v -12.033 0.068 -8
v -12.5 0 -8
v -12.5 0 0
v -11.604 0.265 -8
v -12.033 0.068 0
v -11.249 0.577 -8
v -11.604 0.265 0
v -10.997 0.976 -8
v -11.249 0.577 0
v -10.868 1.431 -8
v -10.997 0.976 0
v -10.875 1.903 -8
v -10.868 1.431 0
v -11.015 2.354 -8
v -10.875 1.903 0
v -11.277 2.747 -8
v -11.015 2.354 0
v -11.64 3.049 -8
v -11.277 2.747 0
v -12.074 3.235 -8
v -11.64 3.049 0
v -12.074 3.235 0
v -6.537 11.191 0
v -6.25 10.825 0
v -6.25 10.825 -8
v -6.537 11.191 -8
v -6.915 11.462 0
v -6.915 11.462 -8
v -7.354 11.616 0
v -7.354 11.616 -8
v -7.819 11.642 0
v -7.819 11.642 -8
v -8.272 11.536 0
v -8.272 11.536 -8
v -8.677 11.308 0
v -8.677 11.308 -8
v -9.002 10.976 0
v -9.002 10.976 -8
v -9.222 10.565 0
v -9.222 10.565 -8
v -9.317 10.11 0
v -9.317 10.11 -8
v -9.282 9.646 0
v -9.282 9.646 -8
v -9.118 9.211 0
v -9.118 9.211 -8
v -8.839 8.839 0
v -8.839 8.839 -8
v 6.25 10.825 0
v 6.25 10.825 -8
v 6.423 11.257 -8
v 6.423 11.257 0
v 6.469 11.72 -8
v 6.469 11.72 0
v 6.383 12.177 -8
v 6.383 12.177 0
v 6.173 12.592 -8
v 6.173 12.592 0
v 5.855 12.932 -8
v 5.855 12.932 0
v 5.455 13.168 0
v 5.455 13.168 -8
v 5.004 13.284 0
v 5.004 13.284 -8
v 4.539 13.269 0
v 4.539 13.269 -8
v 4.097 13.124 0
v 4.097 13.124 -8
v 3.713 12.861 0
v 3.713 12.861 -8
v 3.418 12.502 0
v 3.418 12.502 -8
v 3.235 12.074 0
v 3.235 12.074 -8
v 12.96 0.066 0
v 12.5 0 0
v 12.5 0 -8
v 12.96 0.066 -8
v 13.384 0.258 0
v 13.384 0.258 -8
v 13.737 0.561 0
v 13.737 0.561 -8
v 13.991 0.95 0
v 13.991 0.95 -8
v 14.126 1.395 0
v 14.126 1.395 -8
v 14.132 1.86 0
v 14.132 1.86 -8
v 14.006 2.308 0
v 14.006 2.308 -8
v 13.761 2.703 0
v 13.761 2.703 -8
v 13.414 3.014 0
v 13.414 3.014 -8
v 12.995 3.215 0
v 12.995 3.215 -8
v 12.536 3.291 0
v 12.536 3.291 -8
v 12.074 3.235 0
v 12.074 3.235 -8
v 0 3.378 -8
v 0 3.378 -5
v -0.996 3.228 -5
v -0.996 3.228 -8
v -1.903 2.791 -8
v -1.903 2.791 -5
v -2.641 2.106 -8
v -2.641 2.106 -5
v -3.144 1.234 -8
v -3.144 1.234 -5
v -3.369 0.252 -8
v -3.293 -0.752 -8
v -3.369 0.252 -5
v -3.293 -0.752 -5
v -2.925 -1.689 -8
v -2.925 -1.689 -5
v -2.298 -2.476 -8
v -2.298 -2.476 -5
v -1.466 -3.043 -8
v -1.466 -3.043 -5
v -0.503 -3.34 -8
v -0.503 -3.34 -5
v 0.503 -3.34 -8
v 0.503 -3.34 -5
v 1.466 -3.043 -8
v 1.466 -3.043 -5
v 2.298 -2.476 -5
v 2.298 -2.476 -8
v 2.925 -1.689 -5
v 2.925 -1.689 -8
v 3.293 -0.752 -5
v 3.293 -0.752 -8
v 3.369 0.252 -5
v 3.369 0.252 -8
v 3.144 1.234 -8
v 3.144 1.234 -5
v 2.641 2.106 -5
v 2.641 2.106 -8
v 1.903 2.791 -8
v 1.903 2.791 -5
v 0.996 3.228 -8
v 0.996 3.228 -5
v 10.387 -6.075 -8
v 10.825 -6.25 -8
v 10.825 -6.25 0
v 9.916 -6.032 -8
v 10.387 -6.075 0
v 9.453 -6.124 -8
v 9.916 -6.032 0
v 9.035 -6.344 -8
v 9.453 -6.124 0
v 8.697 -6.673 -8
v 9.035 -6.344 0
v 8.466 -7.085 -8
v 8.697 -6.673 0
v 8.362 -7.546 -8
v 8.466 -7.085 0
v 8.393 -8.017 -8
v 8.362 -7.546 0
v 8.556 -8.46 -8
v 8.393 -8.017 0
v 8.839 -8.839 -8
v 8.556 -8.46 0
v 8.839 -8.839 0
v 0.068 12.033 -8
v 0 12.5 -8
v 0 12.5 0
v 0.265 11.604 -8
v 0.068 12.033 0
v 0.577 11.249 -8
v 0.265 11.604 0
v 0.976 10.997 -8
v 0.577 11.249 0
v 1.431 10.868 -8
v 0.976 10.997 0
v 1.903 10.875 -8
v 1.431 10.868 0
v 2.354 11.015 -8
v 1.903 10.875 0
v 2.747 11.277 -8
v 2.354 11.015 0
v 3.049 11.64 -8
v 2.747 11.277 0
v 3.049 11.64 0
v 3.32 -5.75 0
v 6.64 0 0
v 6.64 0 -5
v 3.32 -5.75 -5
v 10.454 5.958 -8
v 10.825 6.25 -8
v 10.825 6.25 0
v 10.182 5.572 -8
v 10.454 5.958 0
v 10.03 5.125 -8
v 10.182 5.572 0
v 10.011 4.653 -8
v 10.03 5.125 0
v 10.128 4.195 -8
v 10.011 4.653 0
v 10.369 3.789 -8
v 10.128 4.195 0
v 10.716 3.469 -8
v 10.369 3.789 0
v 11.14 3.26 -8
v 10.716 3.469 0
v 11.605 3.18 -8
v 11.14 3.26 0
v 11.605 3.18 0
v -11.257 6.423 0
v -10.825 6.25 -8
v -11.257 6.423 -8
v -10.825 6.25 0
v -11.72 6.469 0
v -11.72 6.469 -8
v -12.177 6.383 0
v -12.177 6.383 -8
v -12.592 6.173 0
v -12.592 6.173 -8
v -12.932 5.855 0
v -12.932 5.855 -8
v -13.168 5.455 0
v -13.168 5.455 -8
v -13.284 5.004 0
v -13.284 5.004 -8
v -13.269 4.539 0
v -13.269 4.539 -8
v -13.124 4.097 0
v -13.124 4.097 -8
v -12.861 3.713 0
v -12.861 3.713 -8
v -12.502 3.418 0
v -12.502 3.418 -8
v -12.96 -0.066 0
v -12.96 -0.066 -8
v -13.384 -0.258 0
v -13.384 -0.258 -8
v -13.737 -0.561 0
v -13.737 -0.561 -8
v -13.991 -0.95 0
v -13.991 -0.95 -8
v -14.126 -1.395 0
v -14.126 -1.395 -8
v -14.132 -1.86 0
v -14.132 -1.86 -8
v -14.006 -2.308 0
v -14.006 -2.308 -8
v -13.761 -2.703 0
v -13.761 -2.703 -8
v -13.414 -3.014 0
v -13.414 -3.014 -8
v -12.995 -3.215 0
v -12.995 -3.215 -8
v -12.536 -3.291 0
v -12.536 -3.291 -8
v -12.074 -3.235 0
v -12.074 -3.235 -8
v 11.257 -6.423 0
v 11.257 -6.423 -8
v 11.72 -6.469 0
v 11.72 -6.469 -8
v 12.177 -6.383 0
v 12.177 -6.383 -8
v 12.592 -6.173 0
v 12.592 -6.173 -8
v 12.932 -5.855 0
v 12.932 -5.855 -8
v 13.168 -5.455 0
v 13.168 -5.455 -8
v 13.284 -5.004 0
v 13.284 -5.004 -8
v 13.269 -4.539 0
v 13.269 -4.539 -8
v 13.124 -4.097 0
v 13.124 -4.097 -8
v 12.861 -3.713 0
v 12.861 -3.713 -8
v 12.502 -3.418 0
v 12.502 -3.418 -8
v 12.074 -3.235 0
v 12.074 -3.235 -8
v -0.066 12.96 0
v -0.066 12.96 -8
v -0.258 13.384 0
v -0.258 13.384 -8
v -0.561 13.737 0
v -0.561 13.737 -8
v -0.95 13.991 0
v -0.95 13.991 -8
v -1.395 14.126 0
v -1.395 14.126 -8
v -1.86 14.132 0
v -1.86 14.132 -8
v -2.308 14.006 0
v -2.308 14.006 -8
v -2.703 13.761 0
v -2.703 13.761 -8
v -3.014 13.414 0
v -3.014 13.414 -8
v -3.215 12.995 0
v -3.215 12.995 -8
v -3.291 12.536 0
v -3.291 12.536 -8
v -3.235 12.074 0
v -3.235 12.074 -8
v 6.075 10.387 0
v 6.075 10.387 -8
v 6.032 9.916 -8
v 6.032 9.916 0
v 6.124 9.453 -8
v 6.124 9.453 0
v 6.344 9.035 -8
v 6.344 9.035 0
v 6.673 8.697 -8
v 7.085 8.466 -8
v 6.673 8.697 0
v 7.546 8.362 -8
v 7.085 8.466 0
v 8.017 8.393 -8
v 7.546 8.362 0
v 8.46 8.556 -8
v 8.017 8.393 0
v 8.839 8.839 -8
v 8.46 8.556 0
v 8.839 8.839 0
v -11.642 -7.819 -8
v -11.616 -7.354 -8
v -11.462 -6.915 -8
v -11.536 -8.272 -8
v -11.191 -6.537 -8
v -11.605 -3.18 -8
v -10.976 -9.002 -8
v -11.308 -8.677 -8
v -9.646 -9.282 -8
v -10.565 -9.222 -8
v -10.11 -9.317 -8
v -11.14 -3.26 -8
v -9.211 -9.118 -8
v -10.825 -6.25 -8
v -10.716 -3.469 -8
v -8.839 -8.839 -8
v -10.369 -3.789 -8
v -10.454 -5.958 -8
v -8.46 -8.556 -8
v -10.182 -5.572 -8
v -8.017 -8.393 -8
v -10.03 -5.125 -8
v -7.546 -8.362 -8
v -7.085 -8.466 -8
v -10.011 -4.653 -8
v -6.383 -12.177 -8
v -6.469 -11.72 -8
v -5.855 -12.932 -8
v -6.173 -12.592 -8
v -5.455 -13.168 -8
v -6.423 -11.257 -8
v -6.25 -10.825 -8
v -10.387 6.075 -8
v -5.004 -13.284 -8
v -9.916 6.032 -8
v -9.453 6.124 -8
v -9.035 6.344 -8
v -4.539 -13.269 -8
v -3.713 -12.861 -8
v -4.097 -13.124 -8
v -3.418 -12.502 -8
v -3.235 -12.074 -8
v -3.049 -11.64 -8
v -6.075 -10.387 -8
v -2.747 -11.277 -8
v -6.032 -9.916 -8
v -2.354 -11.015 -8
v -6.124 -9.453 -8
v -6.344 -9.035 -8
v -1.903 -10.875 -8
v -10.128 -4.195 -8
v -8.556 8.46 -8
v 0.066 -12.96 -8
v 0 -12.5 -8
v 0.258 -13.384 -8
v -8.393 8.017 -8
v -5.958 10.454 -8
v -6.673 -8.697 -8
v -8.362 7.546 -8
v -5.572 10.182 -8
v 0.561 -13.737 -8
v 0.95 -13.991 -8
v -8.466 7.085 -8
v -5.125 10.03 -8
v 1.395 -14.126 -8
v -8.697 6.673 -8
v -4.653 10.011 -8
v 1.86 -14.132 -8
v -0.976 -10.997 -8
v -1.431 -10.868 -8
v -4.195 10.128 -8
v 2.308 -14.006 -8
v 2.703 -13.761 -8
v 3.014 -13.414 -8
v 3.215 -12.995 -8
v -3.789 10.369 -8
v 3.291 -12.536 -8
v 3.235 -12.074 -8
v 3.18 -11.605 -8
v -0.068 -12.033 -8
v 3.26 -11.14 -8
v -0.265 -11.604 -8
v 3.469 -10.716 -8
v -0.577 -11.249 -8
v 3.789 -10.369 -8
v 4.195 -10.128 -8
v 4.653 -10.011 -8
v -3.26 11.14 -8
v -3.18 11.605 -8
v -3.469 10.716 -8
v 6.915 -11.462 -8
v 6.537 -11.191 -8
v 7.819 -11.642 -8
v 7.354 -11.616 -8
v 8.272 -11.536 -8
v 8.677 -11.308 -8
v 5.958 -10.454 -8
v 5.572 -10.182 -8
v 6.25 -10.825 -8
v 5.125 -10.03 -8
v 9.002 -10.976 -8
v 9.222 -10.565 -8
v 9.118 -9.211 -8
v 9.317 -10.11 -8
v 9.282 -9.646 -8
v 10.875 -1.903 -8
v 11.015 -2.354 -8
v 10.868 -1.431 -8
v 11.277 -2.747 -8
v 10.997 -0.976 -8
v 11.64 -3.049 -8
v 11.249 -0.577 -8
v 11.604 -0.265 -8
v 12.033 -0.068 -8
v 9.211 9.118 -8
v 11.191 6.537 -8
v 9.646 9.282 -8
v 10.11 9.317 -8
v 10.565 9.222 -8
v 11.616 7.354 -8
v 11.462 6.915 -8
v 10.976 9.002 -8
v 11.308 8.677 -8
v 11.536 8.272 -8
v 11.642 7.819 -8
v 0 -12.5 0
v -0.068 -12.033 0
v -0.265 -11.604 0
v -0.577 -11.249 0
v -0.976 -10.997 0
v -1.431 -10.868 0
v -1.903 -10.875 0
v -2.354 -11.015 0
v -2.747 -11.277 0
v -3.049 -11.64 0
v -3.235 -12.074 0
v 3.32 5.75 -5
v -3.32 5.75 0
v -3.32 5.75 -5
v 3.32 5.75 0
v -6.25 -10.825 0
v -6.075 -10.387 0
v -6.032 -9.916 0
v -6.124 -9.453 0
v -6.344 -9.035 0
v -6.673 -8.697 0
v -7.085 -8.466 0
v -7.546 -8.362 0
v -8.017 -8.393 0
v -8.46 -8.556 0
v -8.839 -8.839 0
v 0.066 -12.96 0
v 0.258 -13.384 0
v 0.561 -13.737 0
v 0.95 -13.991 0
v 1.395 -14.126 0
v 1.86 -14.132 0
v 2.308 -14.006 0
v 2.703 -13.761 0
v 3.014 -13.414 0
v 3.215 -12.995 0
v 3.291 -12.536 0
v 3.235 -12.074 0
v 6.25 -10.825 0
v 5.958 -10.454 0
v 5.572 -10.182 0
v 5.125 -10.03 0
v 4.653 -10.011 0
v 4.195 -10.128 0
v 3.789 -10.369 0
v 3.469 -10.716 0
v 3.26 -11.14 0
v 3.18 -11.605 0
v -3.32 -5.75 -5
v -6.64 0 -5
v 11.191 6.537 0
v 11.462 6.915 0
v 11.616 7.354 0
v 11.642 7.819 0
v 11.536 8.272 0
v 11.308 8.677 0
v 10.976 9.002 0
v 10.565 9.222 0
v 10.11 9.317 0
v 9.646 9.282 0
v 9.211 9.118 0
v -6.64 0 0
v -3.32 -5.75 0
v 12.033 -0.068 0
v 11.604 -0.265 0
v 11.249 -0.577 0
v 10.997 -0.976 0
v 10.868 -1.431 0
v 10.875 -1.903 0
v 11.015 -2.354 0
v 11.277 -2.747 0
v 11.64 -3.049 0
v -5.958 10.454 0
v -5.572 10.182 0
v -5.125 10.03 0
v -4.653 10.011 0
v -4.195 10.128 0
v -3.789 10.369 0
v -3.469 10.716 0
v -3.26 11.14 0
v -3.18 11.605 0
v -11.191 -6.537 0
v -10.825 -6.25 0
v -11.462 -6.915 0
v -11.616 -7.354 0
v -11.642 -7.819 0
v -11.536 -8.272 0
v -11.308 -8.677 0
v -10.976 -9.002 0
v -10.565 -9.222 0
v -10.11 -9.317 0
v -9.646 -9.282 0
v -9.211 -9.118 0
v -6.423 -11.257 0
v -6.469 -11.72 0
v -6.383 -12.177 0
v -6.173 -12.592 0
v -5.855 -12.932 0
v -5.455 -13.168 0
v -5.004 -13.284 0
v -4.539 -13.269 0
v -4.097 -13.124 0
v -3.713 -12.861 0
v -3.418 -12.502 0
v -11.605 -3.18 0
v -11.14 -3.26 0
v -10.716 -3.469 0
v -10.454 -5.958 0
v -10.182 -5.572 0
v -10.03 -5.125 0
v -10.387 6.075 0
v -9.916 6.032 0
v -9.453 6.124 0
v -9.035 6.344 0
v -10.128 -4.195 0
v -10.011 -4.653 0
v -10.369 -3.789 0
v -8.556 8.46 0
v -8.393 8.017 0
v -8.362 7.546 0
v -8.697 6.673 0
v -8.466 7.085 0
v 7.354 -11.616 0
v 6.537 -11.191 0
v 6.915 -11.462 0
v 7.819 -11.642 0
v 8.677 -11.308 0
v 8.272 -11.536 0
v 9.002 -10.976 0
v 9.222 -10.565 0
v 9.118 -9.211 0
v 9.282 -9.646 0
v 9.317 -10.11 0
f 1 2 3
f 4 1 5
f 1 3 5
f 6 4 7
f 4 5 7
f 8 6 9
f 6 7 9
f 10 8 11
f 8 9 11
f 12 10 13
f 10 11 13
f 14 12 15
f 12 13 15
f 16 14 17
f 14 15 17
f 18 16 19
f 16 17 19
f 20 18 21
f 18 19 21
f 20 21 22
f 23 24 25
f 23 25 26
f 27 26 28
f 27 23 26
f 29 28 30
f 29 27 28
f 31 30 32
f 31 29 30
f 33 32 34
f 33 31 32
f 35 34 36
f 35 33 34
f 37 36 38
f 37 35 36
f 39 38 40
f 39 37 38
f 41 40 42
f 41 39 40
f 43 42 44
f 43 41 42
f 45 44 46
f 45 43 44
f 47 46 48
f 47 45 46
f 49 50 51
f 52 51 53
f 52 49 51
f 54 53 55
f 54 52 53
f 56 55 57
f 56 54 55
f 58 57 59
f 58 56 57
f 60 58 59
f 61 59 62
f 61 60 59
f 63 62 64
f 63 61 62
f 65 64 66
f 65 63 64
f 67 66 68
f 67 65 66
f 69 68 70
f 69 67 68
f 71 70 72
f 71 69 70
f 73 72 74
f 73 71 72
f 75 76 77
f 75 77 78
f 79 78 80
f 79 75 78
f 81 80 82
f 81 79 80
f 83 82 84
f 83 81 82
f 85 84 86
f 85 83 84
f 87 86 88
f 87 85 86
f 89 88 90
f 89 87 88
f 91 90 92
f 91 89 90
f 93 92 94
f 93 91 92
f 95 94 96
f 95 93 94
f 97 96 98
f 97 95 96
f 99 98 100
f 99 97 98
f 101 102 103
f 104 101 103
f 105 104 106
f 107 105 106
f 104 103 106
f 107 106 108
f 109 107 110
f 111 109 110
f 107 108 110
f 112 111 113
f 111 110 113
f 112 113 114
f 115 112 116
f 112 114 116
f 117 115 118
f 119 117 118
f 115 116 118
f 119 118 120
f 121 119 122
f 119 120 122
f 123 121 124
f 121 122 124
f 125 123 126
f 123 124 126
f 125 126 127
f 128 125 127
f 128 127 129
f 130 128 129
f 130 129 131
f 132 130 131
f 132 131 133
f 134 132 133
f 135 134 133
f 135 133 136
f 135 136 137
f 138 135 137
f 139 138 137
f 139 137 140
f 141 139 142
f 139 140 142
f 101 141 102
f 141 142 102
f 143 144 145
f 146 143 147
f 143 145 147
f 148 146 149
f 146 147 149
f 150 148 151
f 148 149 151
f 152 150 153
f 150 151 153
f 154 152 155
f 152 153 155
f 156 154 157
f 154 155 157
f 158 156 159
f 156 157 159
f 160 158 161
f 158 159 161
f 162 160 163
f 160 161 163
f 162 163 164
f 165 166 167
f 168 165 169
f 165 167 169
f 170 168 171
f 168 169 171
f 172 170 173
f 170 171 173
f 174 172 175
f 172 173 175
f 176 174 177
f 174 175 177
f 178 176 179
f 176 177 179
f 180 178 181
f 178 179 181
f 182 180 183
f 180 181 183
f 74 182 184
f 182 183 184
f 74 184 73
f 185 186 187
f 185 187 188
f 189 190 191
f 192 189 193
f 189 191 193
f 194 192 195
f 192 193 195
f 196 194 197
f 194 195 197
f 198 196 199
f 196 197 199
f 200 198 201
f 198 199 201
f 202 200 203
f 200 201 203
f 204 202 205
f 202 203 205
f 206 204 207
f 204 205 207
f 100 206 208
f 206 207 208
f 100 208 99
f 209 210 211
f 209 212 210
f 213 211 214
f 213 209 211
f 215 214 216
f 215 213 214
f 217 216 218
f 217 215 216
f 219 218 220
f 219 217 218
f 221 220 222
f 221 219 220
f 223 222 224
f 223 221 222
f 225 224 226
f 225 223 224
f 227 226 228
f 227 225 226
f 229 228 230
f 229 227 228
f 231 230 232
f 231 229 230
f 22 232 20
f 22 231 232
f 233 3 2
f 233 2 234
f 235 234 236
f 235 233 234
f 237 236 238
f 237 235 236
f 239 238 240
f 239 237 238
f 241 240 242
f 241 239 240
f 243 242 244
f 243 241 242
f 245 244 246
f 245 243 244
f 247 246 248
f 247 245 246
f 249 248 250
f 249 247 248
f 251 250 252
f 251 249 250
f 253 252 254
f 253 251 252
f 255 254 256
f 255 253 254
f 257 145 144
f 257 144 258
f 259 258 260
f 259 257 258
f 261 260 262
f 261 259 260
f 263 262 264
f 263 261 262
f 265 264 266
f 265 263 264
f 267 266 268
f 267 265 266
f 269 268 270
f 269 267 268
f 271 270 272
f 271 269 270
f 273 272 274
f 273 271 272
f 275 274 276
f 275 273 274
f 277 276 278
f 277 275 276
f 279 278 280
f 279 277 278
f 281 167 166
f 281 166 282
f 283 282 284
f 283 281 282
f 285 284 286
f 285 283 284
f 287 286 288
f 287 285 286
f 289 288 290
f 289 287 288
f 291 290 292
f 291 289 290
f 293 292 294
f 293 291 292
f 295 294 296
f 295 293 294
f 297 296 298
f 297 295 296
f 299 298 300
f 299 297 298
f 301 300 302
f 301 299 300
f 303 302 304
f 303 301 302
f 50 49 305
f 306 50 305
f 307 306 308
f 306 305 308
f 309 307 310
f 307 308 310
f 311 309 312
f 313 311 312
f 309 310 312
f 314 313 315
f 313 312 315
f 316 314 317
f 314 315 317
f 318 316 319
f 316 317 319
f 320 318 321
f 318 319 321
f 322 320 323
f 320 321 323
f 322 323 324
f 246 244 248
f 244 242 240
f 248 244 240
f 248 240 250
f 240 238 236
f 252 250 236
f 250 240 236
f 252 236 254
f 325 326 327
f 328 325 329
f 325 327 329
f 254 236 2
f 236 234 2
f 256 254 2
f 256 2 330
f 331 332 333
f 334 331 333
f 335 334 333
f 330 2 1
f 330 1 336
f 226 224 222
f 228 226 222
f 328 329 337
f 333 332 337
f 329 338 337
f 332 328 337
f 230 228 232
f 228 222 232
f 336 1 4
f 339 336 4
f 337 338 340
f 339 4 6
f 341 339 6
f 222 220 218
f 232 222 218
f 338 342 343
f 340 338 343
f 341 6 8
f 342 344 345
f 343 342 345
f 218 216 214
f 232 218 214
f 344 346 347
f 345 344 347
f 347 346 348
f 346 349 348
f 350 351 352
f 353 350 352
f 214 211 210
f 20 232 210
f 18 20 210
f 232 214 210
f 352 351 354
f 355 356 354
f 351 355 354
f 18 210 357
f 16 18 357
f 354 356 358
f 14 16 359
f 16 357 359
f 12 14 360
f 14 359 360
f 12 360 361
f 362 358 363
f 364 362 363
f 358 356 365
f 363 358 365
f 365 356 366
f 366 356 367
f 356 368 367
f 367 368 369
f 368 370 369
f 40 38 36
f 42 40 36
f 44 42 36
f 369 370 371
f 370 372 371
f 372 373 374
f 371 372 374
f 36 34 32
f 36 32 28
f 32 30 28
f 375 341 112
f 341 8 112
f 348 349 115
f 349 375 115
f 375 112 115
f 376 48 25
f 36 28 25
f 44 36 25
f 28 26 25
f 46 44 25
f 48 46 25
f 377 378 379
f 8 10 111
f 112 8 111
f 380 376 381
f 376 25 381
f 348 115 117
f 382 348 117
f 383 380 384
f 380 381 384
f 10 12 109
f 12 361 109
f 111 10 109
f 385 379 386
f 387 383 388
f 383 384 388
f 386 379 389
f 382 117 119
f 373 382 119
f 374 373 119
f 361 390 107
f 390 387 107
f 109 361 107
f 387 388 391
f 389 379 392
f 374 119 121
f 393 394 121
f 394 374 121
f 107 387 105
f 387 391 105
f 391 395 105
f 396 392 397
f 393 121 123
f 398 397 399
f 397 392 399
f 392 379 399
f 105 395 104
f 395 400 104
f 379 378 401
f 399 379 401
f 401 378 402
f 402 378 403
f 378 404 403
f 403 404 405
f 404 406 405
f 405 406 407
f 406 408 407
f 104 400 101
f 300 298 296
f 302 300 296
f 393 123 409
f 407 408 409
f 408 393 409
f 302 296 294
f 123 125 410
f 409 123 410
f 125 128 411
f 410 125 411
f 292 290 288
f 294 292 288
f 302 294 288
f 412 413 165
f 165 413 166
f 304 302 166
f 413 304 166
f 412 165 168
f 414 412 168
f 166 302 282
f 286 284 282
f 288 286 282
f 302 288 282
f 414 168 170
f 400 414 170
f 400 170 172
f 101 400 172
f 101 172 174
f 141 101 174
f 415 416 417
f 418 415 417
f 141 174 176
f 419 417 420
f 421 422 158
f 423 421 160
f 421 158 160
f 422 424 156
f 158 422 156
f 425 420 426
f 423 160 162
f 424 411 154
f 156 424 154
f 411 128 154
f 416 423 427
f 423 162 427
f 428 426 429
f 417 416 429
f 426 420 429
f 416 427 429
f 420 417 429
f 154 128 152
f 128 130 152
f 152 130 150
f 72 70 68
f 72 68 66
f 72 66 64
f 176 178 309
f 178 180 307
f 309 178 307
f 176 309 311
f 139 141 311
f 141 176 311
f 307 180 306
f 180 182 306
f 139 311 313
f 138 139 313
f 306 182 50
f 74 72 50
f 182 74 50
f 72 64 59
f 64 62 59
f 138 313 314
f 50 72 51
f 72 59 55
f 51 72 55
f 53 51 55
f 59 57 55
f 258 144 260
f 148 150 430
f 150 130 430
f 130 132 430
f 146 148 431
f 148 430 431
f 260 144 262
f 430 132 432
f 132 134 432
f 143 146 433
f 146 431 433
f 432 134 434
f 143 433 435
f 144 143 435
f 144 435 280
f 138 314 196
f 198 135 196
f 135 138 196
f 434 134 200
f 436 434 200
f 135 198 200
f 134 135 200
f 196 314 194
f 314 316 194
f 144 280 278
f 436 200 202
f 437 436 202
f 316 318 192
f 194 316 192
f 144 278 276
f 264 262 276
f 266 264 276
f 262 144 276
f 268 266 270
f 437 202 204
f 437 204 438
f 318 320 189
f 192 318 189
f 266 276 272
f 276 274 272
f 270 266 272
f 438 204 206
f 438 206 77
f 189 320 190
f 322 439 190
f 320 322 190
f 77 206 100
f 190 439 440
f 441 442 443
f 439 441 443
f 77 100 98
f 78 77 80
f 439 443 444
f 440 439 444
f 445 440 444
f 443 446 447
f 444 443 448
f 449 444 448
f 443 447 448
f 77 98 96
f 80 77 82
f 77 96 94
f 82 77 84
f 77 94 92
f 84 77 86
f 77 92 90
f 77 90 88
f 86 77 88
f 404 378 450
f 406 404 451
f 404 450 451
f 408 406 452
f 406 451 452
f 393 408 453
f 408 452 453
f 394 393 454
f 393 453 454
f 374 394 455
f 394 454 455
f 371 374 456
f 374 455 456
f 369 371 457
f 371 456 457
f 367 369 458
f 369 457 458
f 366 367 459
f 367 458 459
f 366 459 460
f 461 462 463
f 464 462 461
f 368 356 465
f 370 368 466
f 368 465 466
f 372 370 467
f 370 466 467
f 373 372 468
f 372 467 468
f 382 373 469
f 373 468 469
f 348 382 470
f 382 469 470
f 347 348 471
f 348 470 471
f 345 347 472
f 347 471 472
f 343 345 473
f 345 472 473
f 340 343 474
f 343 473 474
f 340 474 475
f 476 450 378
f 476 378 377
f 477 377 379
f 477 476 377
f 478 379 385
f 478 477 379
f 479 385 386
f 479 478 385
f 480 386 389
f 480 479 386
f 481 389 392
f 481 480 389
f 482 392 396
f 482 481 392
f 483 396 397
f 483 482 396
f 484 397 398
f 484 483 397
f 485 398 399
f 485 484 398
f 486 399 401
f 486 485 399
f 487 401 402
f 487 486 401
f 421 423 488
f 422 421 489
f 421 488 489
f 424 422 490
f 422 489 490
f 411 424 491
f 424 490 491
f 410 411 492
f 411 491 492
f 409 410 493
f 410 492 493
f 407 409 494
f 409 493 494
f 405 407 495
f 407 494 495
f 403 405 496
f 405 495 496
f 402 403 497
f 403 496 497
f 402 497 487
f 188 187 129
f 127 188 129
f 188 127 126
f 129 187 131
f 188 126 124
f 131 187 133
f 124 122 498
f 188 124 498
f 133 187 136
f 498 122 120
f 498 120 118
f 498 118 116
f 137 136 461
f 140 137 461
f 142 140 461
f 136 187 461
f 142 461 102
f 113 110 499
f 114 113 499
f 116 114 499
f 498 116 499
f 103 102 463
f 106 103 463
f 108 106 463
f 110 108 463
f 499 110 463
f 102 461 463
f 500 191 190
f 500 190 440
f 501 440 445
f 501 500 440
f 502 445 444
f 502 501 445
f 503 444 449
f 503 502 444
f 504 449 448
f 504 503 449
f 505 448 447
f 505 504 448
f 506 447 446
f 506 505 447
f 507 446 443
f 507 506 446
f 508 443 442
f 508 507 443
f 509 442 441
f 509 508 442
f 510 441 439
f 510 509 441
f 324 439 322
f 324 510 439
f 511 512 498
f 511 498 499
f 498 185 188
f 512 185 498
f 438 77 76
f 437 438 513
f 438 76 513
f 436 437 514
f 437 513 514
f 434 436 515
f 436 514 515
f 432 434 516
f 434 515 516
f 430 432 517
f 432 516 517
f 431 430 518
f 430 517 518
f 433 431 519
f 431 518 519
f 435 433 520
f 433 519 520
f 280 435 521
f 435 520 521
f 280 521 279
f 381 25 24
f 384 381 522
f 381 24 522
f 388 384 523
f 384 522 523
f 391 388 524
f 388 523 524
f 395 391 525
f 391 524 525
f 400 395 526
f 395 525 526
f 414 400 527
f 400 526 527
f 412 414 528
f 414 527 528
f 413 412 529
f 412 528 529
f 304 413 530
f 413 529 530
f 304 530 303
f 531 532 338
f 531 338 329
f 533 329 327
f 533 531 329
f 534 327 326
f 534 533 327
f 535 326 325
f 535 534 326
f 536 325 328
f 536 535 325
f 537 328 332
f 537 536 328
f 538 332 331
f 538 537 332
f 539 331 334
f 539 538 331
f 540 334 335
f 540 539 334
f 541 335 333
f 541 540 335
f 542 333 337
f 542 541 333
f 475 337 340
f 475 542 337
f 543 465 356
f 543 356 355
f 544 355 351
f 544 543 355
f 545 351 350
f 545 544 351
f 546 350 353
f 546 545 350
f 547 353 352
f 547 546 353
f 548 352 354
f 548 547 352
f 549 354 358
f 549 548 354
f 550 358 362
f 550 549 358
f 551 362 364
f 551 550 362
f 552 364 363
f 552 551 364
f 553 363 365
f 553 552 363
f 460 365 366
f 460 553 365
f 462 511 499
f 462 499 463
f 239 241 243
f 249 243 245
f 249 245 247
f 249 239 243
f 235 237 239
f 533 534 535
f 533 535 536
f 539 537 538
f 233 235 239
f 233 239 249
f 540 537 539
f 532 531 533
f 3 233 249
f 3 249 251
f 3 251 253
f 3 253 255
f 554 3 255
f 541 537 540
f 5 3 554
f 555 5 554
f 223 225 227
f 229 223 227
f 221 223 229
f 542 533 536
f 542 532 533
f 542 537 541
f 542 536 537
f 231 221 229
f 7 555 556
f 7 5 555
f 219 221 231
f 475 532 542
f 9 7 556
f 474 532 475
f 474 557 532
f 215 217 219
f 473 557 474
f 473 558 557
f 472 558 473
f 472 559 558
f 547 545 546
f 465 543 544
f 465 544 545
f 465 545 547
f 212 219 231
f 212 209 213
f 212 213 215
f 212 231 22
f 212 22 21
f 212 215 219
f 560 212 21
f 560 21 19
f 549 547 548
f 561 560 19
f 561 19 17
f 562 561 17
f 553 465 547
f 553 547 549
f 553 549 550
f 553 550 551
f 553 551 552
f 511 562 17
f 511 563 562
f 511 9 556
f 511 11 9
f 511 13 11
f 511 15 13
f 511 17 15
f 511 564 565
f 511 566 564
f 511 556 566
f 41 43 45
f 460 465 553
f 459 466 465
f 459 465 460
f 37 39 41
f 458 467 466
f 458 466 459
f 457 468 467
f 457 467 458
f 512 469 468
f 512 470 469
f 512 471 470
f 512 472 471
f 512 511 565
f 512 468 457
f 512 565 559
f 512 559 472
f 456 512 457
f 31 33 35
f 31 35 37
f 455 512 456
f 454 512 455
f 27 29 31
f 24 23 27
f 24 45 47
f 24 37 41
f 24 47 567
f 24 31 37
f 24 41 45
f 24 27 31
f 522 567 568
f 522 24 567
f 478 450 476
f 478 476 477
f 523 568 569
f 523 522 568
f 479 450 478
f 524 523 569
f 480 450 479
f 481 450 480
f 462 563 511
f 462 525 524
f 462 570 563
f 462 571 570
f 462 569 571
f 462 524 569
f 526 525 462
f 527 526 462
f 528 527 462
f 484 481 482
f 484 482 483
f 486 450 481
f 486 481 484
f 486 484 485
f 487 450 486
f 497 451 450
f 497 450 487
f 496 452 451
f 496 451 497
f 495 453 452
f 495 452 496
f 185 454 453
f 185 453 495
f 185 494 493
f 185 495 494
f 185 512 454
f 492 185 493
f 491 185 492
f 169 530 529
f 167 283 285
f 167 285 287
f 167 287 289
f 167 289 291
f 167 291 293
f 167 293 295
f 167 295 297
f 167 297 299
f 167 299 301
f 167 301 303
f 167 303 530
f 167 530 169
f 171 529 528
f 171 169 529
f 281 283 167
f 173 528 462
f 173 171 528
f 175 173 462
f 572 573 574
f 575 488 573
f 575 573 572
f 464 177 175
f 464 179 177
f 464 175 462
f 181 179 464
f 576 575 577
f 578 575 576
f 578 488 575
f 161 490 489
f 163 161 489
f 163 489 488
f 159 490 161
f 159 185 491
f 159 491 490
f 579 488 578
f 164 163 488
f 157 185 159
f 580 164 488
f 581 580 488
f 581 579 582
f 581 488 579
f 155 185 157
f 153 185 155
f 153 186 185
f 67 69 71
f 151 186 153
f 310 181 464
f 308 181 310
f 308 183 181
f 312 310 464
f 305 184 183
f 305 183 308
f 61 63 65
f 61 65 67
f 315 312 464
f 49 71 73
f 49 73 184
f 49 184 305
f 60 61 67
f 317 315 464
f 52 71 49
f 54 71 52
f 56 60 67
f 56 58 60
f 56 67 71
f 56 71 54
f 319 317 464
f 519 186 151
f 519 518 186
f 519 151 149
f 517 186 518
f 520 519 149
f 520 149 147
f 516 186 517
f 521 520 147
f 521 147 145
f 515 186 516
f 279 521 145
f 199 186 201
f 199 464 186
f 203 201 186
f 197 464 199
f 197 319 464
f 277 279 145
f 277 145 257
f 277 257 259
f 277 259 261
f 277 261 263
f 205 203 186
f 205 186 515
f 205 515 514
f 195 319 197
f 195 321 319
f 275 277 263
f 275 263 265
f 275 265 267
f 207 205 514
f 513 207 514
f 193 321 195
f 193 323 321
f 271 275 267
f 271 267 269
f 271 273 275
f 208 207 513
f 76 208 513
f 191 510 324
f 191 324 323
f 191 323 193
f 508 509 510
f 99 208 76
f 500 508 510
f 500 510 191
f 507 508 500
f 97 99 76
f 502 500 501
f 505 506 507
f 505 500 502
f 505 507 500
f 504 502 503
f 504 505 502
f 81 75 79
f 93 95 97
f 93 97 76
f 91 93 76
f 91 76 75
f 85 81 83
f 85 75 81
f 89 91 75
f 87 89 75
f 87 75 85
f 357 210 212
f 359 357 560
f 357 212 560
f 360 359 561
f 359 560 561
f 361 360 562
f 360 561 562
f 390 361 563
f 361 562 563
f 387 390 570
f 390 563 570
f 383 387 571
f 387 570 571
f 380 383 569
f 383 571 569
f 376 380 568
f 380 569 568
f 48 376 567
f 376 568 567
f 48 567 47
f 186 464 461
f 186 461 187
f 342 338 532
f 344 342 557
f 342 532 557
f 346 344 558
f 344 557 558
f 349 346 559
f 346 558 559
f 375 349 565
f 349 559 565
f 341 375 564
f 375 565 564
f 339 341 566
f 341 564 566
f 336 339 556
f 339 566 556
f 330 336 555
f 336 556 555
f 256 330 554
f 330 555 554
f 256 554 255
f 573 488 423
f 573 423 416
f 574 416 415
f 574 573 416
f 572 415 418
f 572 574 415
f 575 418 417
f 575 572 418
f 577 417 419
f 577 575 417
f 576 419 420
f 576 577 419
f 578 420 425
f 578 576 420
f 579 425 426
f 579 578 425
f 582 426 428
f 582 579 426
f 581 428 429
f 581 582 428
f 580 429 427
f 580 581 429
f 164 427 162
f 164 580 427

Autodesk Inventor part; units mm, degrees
ref_plane "YZ Plane" through (0, 0, 0) normal (1, 0, 0) x (0, 1, 0)
ref_plane "XZ Plane" through (0, 0, 0) normal (0, 1, 0) x (-1, 0, 0)
ref_plane "XY Plane" through (0, 0, 0) normal (0, 0, 1) x (1, 0, 0)
sketch "Sketch1" plane through (0, 0, 0) normal (0, 0, 1) x (1, 0, 0)
  line L0 (3.3198, 5.75) -> (6.6395, 0)
  line L1 (6.6395, 0) -> (3.3198, -5.75)
  line L2 (3.3198, -5.75) -> (-3.3198, -5.75)
  line L3 (-3.3198, -5.75) -> (-6.6395, 0)
  line L4 (-6.6395, 0) -> (-3.3198, 5.75)
  line L5 (-3.3198, 5.75) -> (3.3198, 5.75)
  circle A0 centre (0, 0) radius 12.5
  dimension "d0" = 11.5
  dimension "d1" = 25
extrude "Extrusion1" add sketch "Sketch1" against normal blind 5
sketch "Sketch2" plane through (0, 0, -5) normal (0, 0, -1) x (-1, 0, 0)
  circle A0 centre (0, 0) radius 12.5 projected
extrude "Extrusion2" add sketch "Sketch2" along normal blind 3
sketch "Sketch3" plane through (0, 0, -8) normal (0, 0, -1) x (-1, 0, 0)
  circle A0 centre (0, 0) radius 12.5 construction
hole "Hole1" at (0, 0, -8) direction (0, 0, 1) diameter 6.756 end through all clearance for "Flat Head Machine Screw (82)" size "1/4" standard "Ansi Unified Screw Threads"
sketch "Sketch4" plane through (0, 0, 0) normal (0, 0, 1) x (1, 0, 0)
  circle A0 centre (0, 0) radius 12.5 projected
  arc A1 (0, 12.5) -> (3.2352, 12.0741) centre (1.6457, 12.5) ccw
  arc A2 (6.25, 10.8253) -> (3.2352, 12.0741) centre (4.8248, 11.6481) ccw
  line L0 (0, 12.5) -> (0, 0) construction
  line L1 (-6.25, 10.8253) -> (0, 0) construction
  line L2 (-10.8253, 6.25) -> (0, 0) construction
  line L3 (-12.5, 0) -> (0, 0) construction
  line L4 (-10.8253, -6.25) -> (0, 0) construction
  line L5 (-6.25, -10.8253) -> (0, 0) construction
  line L6 (0, -12.5) -> (0, 0) construction
  line L7 (6.25, -10.8253) -> (0, 0) construction
  line L8 (10.8253, -6.25) -> (0, 0) construction
  line L9 (12.5, 0) -> (0, 0) construction
  line L10 (10.8253, 6.25) -> (0, 0) construction
  line L11 (6.25, 10.8253) -> (0, 0) construction
  dimension "d15" = 360
extrude "Extrusion3" cut sketch "Sketch4" against normal through all contours A0 A1 picked at (1.5636, 11.877)
extrude "Extrusion4" add sketch "Sketch4" against normal up to surface (8 mm away) contours A0 A2
pattern_circular "Circular Pattern1" count 12 over 360 about axis through (0, 0, -10) along (0, 0, 1) of "Extrusion3", "Extrusion4"
properties part number "knurled nut"
